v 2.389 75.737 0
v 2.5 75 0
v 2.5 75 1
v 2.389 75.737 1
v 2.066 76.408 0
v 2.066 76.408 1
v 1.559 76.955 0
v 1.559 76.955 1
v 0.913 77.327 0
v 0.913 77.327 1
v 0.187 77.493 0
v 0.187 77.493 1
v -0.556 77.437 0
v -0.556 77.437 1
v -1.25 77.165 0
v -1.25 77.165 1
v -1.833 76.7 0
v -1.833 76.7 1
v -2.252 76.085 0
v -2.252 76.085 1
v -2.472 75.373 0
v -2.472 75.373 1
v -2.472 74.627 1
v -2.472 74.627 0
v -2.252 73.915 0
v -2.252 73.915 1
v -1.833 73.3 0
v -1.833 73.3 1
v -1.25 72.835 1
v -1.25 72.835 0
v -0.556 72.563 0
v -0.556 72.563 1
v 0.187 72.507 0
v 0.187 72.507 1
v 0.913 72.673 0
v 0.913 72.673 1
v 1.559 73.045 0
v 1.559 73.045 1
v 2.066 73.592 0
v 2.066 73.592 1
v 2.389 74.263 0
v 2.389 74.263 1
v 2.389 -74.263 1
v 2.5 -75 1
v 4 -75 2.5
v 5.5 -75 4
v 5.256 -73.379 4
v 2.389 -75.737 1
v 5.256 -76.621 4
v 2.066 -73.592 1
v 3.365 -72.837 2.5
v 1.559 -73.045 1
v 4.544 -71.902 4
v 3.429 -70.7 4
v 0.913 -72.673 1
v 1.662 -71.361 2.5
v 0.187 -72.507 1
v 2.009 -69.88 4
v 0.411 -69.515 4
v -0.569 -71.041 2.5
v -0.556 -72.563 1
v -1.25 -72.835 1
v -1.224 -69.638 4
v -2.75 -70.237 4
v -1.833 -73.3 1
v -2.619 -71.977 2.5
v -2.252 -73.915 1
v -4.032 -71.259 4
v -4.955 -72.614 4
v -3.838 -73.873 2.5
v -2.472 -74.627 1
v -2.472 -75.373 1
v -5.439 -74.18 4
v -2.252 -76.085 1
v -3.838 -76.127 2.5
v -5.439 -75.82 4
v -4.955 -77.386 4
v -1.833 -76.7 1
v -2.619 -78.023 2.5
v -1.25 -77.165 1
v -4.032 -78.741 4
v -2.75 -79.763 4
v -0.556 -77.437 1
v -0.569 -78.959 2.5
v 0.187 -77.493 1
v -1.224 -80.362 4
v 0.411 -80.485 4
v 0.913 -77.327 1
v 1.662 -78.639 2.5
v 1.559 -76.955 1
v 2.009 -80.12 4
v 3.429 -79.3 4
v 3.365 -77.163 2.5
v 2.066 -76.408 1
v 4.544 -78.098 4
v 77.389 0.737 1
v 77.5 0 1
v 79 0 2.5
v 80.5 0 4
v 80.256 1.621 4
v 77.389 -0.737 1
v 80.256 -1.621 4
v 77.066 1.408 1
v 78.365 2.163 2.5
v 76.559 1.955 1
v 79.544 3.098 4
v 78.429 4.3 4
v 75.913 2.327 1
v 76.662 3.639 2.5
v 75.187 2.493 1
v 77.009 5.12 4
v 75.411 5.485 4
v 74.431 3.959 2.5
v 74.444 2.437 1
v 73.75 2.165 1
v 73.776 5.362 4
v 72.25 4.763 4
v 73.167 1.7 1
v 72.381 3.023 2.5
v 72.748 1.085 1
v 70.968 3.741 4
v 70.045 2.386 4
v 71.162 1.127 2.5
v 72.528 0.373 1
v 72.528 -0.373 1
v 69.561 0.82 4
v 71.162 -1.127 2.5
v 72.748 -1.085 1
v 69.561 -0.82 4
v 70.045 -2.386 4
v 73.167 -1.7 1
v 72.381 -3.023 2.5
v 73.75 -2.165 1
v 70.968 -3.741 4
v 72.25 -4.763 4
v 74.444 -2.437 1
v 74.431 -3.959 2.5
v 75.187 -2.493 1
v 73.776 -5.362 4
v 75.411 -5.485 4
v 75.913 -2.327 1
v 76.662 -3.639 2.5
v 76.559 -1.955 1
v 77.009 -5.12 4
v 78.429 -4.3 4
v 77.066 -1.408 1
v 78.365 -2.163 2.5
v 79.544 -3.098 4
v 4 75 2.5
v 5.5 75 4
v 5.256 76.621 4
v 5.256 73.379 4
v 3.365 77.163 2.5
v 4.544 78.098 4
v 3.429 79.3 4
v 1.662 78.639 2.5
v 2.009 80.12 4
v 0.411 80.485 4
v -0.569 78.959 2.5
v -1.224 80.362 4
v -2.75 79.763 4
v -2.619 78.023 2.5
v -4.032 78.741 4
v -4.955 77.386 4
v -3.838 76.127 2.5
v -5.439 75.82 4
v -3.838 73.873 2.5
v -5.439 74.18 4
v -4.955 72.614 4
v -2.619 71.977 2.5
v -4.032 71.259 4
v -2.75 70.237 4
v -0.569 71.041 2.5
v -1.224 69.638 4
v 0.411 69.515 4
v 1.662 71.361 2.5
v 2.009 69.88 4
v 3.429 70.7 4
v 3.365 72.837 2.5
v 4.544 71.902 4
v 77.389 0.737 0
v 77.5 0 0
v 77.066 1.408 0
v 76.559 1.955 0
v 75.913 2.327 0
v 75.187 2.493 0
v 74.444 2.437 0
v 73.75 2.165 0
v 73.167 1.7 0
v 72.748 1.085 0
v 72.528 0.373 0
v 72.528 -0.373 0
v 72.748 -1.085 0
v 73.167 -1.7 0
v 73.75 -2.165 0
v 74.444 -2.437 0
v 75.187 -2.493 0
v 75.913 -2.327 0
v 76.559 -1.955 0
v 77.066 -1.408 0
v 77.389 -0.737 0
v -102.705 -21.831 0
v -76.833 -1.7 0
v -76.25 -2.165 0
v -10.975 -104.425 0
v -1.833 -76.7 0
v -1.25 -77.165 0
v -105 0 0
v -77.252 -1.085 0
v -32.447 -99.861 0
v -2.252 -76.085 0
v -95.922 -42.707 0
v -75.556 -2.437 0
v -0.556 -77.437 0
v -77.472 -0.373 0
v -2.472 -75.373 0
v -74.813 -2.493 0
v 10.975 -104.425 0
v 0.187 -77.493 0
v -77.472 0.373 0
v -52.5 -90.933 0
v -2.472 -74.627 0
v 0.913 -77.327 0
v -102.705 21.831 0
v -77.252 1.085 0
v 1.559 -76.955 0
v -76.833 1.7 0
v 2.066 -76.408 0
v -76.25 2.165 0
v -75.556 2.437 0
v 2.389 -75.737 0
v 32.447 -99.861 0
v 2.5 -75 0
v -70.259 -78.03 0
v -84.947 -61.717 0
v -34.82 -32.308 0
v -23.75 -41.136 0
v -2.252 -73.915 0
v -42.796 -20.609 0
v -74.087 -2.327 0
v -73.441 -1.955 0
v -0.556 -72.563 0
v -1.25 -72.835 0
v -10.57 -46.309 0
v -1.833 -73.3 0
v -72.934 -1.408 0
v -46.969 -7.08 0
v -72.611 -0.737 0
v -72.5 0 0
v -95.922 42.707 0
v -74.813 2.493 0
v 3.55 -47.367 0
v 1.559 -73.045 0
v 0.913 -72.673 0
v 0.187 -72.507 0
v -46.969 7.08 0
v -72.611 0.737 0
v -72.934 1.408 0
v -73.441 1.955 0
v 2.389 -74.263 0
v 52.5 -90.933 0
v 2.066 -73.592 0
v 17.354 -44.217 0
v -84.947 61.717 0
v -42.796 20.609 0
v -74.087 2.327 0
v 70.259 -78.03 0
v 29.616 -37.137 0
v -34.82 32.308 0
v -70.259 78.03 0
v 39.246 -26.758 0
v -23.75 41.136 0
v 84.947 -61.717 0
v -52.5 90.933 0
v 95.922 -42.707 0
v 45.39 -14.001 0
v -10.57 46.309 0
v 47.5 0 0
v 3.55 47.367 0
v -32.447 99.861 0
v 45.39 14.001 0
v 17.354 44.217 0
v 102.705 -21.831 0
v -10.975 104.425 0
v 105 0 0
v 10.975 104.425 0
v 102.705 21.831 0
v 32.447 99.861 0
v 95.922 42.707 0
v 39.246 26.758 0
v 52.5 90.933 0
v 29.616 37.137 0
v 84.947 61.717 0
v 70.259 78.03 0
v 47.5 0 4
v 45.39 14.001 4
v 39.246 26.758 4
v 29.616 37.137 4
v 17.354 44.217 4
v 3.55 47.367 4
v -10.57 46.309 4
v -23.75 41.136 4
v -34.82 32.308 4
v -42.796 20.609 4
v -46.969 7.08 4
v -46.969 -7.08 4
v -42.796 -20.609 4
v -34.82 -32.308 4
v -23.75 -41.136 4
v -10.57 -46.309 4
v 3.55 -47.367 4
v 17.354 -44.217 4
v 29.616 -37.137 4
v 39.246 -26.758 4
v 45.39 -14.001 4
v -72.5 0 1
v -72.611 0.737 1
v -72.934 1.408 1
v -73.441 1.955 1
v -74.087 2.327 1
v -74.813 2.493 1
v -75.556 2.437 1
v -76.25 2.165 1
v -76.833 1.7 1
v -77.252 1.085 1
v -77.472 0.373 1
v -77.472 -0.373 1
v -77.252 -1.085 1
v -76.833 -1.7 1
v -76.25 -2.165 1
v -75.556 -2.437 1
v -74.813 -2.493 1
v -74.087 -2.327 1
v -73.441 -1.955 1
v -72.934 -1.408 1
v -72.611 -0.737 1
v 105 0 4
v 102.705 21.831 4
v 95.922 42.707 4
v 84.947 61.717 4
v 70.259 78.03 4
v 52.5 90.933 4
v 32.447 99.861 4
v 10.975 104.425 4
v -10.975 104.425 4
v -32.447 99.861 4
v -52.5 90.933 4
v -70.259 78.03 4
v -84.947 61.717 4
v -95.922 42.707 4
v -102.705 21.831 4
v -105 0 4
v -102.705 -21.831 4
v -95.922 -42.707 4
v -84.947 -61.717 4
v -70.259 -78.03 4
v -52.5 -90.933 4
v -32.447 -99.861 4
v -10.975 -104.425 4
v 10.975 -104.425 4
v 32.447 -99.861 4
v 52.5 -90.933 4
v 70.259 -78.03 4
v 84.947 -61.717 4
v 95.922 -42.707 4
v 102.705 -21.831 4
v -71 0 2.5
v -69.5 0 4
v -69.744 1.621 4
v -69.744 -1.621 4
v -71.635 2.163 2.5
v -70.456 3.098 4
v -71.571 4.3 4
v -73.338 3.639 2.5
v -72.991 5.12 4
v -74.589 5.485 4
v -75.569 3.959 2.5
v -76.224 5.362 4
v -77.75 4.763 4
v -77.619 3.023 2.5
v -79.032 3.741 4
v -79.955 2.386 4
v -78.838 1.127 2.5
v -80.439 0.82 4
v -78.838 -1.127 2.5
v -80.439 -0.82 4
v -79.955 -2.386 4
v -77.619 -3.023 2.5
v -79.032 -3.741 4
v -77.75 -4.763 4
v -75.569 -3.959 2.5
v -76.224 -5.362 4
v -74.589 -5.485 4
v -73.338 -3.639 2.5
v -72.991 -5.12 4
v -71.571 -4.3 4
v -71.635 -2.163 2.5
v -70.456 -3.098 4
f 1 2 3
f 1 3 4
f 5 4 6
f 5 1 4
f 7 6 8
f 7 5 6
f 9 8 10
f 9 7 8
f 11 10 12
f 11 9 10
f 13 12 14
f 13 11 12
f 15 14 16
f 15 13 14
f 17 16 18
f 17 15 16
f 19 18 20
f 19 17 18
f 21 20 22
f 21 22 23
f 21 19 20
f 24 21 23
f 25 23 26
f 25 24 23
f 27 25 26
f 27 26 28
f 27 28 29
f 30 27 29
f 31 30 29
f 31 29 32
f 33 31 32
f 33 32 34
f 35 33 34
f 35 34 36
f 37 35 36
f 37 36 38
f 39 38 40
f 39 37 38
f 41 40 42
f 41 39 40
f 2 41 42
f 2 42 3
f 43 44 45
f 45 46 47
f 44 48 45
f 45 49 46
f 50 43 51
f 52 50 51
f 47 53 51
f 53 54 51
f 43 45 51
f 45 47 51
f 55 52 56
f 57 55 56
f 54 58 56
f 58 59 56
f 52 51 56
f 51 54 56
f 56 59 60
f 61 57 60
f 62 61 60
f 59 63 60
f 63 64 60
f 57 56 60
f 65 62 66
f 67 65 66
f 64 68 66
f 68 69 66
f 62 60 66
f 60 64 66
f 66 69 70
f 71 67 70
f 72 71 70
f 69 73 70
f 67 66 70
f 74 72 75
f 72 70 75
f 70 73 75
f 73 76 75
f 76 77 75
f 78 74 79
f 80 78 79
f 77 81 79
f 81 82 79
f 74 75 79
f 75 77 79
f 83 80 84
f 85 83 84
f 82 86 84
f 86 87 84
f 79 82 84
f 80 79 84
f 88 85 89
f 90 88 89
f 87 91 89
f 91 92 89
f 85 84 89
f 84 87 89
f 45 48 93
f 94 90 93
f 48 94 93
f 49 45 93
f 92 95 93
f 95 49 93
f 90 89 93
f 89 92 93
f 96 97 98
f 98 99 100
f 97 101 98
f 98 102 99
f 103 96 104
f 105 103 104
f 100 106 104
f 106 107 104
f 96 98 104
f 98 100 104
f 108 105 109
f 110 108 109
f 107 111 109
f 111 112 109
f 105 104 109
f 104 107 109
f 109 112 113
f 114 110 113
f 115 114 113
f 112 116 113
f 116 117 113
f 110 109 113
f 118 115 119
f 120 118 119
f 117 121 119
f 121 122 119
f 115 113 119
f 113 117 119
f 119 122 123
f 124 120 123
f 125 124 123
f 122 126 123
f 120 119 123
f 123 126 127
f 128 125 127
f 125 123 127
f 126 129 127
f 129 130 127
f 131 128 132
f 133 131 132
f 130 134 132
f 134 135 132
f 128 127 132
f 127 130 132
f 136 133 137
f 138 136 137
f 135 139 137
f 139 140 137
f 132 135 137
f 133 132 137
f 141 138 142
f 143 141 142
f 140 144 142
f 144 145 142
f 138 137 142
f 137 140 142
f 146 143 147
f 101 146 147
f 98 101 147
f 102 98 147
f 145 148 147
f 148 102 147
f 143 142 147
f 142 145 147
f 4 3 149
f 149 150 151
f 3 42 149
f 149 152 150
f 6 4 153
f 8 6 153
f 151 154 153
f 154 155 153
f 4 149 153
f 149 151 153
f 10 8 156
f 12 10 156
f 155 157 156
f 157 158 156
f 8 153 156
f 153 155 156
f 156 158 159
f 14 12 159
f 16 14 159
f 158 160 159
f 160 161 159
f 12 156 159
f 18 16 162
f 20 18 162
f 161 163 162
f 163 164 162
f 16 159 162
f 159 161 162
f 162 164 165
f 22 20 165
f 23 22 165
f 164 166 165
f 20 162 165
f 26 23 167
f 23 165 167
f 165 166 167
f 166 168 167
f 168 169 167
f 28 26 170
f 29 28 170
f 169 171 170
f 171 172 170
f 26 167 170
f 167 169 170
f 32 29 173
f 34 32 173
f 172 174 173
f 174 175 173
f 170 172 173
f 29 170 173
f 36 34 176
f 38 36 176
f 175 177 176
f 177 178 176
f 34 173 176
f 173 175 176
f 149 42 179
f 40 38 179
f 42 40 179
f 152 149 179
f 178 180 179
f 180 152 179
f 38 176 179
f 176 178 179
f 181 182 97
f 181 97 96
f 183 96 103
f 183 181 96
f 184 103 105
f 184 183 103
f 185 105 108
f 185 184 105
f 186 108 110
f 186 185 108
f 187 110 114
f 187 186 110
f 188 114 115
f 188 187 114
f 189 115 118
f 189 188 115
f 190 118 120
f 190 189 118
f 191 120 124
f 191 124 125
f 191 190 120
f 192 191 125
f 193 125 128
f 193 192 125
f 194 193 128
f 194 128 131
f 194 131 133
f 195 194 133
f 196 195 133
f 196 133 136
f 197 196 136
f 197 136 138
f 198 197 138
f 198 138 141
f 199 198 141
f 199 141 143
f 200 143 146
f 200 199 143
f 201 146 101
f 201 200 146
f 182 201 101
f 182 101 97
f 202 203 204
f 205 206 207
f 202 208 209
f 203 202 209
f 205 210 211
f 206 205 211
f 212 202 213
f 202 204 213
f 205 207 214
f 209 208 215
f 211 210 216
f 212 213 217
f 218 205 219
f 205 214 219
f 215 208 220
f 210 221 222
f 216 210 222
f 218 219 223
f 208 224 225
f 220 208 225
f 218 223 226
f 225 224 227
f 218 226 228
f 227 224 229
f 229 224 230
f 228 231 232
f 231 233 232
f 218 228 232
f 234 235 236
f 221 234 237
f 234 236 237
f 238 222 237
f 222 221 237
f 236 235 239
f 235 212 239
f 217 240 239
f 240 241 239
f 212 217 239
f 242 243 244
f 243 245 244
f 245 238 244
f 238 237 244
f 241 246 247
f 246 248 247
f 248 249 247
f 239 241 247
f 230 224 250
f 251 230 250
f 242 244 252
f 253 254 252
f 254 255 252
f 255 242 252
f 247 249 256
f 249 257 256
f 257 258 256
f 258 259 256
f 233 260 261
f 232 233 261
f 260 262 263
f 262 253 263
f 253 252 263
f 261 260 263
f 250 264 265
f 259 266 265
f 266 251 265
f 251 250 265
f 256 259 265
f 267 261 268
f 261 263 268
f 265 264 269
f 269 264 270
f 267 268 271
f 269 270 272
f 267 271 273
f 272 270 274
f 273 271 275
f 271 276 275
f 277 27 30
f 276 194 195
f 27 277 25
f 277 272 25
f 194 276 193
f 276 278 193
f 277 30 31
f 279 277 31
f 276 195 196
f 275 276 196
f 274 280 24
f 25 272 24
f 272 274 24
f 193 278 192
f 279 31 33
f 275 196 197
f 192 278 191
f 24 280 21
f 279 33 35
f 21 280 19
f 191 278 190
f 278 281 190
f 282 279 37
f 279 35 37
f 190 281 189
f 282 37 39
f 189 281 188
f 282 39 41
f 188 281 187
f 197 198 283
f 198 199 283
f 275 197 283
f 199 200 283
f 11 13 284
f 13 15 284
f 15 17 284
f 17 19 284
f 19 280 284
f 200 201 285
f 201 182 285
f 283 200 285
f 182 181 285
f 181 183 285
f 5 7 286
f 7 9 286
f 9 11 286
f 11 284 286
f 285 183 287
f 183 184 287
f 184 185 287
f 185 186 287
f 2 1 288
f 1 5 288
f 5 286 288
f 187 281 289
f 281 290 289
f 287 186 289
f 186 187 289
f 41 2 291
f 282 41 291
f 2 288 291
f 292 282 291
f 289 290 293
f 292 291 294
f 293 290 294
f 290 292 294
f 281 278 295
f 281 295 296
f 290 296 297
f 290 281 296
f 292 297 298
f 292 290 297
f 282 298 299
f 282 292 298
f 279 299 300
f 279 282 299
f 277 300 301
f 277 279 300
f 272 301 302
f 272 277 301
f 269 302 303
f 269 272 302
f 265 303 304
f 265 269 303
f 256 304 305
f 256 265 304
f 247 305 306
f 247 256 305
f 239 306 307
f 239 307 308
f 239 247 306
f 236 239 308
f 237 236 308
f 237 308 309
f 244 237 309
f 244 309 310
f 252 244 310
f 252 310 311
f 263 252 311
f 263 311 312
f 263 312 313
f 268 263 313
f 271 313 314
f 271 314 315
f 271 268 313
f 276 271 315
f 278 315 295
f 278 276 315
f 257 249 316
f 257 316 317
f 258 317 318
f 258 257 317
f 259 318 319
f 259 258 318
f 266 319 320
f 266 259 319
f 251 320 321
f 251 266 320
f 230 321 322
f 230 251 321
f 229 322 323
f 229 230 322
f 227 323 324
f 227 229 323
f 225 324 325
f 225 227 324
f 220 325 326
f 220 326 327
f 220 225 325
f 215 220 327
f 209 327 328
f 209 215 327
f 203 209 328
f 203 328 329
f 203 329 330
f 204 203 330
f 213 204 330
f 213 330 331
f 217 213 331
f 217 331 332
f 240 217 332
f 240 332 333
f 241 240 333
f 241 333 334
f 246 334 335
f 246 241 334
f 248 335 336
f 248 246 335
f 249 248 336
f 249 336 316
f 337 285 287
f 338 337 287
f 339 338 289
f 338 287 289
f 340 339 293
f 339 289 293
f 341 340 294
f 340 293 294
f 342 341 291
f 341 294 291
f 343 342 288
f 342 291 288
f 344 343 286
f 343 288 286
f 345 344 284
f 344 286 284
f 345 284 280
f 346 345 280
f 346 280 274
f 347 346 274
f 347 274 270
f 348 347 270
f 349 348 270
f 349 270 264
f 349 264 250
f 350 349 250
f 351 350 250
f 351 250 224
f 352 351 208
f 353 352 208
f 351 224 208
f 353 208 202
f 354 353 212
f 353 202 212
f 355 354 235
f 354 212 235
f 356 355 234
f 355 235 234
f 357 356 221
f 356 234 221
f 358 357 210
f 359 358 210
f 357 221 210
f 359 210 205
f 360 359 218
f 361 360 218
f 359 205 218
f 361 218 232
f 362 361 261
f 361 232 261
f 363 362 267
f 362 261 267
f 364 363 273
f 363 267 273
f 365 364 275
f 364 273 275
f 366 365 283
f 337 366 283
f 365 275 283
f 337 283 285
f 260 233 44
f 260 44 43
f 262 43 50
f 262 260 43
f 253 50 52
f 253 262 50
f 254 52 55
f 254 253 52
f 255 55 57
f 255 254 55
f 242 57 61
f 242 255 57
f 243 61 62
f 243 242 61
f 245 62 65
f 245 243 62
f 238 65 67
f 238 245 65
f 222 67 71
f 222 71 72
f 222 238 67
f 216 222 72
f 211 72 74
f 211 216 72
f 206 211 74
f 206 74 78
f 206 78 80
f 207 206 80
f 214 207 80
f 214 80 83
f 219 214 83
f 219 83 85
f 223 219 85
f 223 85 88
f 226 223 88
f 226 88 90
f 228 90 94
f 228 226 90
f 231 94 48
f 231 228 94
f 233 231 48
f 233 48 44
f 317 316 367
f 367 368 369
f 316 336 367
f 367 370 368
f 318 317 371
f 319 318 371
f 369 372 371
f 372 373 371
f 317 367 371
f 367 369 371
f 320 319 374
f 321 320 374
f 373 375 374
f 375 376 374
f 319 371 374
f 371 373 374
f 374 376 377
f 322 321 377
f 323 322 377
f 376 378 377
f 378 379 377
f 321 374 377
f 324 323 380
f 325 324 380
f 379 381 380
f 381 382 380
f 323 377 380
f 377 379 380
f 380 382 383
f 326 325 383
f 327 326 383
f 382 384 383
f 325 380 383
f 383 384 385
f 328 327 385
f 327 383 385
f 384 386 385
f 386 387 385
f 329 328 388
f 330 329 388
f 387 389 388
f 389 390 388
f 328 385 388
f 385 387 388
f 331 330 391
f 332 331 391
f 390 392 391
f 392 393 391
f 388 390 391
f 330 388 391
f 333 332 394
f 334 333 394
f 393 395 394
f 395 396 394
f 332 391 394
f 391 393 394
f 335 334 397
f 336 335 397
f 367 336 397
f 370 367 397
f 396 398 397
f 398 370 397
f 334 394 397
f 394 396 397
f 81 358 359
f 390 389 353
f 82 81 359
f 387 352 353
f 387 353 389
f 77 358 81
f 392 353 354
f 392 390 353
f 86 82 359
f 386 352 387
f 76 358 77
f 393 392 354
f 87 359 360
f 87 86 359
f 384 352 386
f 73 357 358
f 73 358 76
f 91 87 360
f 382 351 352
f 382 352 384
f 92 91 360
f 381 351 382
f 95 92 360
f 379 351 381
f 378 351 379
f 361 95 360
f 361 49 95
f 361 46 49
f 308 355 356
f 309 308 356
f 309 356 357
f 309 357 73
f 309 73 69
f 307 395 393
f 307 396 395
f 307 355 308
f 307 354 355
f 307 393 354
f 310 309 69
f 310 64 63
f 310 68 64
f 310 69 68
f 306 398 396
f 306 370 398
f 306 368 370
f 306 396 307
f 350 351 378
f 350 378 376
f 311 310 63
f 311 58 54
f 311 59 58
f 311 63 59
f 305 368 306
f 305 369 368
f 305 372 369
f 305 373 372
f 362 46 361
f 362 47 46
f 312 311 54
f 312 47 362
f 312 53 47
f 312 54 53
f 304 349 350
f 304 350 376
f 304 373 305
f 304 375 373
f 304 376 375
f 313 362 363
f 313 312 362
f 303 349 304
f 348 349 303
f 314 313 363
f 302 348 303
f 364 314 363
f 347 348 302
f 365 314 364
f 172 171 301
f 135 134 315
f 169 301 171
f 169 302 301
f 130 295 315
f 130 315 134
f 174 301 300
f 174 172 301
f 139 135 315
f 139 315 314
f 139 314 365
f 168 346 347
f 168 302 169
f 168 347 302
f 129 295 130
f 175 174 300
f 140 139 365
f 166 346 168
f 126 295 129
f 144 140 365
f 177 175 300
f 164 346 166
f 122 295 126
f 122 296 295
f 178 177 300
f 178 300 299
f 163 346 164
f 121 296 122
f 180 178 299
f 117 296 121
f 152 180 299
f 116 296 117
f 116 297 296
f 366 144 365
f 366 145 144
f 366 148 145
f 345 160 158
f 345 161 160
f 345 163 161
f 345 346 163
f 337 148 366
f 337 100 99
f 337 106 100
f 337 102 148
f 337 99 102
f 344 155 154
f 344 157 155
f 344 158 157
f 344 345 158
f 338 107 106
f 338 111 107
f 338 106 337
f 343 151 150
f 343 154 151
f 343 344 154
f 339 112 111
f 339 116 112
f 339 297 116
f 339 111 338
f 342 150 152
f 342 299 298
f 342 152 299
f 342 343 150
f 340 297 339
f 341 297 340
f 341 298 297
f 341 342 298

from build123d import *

# Parameters (mm, degrees)
SKETCH1_R           = 105
SKETCH1_R_2         = 47.5
SKETCH1_R_3         = 2.5
BOSS_EXTRUDE1_DEPTH = 4
CHAMFER1_SIZE       = 3


with BuildPart() as part:
    # Sketch1 → Boss-Extrude1 (new body)
    with BuildSketch(Plane.XY):
        Circle(SKETCH1_R)
        Circle(SKETCH1_R_2, mode=Mode.SUBTRACT)
        with Locations((0, 75)):
            Circle(SKETCH1_R_3, mode=Mode.SUBTRACT)
        with Locations((75, 0)):
            Circle(SKETCH1_R_3, mode=Mode.SUBTRACT)
        with Locations((0, -75)):
            Circle(SKETCH1_R_3, mode=Mode.SUBTRACT)
        with Locations((-75, 0)):
            Circle(SKETCH1_R_3, mode=Mode.SUBTRACT)
    extrude(amount=BOSS_EXTRUDE1_DEPTH)

    # Chamfer1
    chamfer1_edges = [part.edges().sort_by_distance(p)[0] for p in [
        (72.5, 0, 4),
        (-2.5, -75, 4),
        (-77.5, 0, 4),
        (-2.5, 75, 4),
    ]]
    chamfer(chamfer1_edges, length=CHAMFER1_SIZE)


solid = part.part
